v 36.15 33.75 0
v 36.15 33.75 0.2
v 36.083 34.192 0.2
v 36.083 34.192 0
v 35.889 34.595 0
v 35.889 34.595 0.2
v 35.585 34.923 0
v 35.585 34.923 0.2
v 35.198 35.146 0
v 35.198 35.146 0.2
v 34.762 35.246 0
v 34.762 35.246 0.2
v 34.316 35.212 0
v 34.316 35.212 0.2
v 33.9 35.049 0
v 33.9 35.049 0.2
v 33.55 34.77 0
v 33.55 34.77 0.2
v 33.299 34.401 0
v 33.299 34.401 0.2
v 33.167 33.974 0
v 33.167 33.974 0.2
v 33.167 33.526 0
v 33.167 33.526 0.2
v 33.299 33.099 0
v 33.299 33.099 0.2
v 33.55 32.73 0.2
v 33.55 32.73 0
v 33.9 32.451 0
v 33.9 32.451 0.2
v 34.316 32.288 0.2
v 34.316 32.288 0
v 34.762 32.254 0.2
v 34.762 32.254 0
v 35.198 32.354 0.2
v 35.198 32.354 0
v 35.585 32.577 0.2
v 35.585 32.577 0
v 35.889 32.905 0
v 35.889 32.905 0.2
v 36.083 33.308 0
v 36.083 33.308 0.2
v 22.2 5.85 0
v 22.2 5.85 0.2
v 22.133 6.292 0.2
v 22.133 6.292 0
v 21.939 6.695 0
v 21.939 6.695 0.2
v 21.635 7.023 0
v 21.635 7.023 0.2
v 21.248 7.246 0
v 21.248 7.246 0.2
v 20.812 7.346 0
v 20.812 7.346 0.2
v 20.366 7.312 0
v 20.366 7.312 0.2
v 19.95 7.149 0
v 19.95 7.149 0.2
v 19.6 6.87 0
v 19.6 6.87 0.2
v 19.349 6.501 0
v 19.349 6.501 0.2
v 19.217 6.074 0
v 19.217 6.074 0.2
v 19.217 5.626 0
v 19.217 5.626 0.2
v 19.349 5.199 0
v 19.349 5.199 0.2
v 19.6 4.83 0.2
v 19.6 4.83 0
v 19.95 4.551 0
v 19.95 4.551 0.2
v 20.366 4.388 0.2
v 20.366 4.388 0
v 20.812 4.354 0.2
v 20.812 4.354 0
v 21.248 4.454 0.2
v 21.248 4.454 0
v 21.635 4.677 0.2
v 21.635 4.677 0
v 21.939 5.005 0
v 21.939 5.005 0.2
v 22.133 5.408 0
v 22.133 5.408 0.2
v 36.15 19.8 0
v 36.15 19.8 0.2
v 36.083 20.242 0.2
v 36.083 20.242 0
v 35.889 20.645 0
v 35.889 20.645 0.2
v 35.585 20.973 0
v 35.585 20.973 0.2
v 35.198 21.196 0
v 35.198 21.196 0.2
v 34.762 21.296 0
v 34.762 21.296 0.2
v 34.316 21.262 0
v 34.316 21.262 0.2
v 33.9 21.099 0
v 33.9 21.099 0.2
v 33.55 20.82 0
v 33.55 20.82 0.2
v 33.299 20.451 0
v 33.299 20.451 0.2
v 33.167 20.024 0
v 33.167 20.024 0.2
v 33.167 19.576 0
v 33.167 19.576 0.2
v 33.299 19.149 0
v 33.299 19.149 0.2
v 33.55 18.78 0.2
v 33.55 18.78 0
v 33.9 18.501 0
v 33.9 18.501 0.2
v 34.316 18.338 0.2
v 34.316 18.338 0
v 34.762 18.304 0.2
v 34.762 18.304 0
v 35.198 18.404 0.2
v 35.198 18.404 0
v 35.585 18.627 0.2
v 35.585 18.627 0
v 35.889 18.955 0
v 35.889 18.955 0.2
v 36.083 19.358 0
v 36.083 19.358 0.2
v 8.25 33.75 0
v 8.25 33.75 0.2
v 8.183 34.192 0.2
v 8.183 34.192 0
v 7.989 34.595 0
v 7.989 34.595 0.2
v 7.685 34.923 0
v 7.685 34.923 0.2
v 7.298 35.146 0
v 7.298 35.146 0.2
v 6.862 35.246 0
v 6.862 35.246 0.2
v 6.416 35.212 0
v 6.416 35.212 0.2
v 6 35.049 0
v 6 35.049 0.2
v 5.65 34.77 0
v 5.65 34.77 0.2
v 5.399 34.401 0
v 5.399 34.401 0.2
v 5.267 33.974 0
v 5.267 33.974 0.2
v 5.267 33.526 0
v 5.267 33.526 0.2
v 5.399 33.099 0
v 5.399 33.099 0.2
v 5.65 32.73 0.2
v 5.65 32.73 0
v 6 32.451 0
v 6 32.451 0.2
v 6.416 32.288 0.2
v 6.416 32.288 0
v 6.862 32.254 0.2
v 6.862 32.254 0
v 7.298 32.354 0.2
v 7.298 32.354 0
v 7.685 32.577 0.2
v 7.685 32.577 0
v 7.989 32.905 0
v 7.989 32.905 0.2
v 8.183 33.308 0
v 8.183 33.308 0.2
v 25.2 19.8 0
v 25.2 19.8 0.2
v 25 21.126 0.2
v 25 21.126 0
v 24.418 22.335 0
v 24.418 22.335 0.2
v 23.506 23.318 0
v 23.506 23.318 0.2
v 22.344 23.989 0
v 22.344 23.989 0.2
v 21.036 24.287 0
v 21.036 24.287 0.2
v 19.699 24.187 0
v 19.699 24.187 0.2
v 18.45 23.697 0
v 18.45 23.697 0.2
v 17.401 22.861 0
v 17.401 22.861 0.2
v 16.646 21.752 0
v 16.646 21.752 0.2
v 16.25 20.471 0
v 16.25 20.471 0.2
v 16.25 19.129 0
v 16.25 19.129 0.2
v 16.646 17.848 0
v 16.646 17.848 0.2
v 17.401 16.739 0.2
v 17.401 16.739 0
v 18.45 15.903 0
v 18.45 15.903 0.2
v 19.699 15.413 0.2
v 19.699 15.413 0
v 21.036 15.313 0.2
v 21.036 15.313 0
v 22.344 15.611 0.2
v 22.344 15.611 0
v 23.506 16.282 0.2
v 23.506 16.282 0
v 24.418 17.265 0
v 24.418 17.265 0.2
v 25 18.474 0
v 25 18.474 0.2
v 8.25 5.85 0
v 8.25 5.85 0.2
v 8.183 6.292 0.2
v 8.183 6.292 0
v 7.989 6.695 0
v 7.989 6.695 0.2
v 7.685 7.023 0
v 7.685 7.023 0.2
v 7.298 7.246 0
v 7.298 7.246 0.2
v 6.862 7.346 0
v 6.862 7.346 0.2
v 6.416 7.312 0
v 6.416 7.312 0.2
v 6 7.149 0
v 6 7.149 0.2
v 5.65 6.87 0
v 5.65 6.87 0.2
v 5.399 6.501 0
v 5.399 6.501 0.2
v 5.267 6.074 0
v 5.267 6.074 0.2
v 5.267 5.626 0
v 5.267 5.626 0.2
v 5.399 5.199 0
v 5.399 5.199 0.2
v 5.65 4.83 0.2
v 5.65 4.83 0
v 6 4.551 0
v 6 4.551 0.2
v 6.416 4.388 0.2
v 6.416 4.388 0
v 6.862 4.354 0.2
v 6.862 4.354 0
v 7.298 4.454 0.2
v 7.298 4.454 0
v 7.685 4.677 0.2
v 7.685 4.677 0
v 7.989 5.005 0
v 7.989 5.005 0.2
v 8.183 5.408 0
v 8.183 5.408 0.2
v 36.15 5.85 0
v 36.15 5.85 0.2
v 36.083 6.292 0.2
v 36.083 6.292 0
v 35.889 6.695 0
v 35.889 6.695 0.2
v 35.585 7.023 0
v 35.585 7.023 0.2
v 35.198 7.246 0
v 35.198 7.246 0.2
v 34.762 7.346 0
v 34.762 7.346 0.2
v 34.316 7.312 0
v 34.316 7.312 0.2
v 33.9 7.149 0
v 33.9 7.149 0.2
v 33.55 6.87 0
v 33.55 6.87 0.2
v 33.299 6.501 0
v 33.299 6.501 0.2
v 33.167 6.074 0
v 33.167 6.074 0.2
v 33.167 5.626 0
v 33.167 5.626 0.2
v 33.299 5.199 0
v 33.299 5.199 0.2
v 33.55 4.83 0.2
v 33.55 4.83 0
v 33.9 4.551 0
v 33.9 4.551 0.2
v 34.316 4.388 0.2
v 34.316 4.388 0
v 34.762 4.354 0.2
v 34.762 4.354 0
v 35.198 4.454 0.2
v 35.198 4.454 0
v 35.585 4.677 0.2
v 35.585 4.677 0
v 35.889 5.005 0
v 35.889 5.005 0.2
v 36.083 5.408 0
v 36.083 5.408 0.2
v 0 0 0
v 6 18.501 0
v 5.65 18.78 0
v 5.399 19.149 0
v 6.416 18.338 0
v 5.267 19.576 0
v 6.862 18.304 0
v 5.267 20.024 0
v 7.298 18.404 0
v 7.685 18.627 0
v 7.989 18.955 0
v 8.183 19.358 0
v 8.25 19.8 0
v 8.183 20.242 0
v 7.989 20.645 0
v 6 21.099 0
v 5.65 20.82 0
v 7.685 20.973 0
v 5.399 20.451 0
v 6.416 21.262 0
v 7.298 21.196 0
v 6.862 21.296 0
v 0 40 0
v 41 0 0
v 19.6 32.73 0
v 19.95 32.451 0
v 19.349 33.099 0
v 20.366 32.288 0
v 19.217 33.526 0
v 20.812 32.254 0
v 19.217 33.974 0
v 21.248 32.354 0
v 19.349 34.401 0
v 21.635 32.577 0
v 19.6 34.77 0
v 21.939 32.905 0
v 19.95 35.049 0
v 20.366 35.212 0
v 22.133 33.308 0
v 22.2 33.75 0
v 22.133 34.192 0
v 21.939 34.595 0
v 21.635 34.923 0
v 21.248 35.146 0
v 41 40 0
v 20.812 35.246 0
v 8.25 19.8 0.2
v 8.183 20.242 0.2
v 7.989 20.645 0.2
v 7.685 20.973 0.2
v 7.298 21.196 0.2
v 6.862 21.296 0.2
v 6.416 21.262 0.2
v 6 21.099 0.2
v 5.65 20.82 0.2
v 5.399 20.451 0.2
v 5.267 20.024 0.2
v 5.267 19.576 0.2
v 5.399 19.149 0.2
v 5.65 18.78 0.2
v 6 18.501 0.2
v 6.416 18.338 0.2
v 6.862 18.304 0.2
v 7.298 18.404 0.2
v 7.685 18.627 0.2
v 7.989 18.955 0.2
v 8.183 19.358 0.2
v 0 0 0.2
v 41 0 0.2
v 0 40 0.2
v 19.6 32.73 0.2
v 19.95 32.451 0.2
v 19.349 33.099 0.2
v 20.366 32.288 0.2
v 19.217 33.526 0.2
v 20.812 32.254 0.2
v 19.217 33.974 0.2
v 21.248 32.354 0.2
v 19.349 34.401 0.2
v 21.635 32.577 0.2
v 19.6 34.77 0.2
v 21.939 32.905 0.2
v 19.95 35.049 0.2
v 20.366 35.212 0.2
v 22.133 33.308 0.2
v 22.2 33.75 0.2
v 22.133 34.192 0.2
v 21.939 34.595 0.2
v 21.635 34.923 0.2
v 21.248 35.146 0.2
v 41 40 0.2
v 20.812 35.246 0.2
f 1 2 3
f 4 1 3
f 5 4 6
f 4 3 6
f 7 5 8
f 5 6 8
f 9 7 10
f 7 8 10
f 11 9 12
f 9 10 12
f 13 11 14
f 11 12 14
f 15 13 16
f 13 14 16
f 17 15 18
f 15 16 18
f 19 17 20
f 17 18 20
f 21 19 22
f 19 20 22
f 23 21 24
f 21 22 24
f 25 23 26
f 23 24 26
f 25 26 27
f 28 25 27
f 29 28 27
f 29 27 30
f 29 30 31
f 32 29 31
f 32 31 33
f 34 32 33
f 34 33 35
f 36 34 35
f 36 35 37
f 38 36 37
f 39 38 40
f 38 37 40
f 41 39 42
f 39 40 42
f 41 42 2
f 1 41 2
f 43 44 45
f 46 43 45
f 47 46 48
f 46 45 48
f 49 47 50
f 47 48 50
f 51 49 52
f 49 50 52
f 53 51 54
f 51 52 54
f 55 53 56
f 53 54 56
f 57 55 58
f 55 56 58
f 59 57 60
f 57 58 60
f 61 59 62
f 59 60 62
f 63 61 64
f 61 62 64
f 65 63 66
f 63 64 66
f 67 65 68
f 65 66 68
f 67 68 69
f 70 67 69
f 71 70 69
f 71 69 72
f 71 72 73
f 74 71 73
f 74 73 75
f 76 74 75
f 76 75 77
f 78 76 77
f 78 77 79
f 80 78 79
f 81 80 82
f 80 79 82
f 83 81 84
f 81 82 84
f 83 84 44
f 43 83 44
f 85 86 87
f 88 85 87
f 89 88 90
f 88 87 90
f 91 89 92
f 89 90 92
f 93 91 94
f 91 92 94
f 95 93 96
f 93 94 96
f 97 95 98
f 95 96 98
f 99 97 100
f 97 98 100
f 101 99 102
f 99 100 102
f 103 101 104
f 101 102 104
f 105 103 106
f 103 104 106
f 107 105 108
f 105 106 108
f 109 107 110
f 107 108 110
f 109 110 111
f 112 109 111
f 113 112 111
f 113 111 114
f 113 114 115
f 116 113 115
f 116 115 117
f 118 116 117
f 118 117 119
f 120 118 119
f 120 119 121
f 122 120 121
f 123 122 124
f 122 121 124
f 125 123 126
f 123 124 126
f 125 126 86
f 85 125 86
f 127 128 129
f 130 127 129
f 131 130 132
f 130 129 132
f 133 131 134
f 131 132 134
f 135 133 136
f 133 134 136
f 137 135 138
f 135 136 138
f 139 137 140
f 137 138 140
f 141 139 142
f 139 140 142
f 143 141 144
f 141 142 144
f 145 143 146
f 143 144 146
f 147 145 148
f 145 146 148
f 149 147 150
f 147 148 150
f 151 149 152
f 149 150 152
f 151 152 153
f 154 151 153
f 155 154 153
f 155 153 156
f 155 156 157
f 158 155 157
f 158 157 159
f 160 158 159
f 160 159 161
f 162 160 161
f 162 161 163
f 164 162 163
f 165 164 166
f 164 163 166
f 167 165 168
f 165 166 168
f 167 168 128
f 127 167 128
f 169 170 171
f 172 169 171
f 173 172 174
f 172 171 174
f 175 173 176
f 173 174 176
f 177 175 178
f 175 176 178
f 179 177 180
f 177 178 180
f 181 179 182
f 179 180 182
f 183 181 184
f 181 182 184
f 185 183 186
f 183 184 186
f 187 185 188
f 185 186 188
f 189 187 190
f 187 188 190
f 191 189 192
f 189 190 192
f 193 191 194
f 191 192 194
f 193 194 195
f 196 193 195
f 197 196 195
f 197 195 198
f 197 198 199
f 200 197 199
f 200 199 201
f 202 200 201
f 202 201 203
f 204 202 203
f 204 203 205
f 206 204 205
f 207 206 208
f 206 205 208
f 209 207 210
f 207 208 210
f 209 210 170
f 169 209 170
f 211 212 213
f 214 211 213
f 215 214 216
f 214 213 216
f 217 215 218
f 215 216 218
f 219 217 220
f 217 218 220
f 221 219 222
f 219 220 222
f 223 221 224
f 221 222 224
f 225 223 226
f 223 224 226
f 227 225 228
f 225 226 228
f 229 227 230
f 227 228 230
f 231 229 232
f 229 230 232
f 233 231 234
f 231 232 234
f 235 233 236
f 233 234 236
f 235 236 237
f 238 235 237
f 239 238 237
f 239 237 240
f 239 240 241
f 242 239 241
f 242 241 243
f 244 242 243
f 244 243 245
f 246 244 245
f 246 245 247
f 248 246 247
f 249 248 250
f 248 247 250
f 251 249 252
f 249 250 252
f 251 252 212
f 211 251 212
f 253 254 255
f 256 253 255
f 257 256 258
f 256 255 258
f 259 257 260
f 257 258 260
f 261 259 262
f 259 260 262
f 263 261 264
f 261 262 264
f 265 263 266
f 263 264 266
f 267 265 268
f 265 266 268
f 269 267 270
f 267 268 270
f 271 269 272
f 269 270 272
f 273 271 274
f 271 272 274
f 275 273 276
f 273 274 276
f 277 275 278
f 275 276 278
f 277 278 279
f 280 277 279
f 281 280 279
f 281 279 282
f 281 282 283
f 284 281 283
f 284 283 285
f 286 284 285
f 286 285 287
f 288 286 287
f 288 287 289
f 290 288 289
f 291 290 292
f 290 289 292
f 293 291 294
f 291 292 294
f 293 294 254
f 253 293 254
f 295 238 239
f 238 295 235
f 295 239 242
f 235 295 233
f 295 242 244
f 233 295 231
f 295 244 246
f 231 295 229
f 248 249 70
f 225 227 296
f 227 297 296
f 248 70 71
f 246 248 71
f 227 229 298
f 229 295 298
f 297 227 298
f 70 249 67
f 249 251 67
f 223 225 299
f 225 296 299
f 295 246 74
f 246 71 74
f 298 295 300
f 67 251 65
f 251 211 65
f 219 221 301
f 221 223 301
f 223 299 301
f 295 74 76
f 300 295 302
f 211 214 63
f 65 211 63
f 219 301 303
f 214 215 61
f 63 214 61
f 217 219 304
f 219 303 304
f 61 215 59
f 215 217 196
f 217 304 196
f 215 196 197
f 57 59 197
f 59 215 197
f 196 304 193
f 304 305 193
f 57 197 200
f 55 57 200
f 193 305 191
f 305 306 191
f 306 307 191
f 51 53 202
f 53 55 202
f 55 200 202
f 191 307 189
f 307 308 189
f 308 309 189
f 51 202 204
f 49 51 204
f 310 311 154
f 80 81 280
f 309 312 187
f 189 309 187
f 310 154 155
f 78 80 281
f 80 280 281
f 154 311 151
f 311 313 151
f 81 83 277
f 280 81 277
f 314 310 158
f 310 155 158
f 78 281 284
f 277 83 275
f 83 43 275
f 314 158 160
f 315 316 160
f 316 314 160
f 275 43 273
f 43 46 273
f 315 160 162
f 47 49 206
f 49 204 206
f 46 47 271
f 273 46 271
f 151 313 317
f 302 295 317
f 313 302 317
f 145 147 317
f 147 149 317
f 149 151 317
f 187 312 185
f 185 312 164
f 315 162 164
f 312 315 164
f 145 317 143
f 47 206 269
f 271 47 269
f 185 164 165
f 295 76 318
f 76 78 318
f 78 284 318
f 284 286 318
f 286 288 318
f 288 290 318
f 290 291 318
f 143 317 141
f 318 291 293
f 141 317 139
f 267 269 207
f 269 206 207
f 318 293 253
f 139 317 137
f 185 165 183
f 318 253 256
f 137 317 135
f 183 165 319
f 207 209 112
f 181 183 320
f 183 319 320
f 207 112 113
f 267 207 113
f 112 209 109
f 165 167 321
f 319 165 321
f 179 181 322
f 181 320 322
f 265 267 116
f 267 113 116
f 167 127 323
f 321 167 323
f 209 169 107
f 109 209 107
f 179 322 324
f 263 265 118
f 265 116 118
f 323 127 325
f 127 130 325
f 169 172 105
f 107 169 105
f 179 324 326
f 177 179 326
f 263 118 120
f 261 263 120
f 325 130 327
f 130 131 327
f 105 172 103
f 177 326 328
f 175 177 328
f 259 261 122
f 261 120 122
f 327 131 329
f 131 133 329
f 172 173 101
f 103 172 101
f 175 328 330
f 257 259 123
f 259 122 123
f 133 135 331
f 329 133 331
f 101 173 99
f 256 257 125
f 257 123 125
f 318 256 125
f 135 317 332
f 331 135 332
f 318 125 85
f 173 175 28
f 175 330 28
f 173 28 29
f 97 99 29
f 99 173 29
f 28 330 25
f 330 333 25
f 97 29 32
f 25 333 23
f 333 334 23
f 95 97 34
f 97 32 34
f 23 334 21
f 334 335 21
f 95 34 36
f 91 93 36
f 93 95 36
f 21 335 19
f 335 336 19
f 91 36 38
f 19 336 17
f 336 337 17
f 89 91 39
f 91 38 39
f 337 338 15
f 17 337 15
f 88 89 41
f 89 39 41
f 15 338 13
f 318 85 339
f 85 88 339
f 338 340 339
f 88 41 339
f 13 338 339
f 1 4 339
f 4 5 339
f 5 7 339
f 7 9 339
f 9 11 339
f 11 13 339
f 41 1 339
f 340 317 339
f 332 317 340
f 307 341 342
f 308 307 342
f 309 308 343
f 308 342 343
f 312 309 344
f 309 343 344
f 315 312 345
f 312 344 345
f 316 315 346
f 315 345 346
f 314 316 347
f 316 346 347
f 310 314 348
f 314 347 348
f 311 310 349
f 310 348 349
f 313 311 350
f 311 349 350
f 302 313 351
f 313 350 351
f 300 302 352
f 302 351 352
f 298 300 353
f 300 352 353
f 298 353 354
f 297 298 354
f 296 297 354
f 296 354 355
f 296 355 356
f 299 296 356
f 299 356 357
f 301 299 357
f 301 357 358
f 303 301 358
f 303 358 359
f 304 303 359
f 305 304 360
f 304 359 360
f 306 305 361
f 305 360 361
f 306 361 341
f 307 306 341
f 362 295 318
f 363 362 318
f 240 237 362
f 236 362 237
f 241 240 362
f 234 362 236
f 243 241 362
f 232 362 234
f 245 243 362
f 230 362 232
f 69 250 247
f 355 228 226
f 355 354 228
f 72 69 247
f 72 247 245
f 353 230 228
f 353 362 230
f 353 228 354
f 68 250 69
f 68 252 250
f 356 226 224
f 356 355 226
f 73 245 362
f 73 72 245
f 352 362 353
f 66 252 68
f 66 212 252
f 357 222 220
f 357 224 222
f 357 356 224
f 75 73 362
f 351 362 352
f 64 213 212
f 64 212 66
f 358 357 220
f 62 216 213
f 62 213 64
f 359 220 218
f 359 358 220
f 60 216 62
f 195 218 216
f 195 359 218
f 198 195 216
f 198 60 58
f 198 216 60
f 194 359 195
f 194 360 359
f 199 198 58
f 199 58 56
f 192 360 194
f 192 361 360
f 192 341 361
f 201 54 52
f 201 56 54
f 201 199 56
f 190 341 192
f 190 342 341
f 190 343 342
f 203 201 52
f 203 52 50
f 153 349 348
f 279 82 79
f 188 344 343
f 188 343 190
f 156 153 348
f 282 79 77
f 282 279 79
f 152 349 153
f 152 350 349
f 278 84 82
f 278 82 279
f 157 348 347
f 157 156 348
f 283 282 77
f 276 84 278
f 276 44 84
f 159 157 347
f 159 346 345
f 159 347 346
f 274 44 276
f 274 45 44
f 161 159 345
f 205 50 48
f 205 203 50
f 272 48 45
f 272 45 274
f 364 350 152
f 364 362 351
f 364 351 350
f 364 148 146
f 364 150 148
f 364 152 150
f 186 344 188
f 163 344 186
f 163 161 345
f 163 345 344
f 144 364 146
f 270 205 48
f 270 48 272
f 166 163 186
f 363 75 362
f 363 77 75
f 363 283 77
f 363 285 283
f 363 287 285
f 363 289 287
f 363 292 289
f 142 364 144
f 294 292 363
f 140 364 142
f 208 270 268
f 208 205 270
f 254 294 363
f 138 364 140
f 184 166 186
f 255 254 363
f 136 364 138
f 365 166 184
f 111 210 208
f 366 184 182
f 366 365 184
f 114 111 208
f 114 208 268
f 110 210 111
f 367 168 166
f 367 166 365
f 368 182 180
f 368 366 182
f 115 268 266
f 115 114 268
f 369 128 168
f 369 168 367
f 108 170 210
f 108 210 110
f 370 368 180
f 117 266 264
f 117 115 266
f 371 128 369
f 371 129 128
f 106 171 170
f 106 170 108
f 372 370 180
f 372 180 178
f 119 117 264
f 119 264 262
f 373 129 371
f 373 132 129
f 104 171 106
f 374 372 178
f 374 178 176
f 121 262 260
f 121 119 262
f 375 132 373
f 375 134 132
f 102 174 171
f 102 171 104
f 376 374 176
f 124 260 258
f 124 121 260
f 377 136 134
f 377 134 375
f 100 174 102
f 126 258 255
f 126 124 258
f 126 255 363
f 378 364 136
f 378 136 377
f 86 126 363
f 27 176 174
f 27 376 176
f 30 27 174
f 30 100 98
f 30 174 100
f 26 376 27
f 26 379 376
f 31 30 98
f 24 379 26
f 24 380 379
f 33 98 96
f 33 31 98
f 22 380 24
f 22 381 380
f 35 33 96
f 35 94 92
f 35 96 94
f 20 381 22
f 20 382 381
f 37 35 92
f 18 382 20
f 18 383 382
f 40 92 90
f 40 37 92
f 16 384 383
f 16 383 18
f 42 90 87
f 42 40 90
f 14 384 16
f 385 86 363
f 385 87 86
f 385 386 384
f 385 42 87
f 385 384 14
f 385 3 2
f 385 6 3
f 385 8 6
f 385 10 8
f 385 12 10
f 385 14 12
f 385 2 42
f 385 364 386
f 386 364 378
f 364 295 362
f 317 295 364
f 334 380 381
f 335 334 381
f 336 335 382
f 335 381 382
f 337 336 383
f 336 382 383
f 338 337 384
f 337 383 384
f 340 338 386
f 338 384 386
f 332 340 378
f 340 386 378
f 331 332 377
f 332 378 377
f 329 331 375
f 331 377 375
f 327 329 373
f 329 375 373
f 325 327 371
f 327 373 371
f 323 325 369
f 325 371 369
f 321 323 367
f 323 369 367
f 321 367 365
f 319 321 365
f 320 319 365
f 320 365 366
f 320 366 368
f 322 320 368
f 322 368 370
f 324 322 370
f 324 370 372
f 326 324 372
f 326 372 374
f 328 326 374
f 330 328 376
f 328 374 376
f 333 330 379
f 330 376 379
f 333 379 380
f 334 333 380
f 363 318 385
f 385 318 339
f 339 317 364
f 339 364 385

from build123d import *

# Parameters (mm, degrees)
SKETCH_1_W          = 41
SKETCH_1_H          = 40
EXTRUDE_1_DEPTH     = 0.2
SKETCH_5_R          = 4.5
CUT_EXTRUDE_3_DEPTH = 0.2
SKETCH_6_R          = 1.5
CUT_EXTRUDE_4_DEPTH = 0.2


with BuildPart() as part:
    # 스케치1 → 보스-돌출1 (new body)
    with BuildSketch(Plane.XY):
        with Locations((20.5, 20)):
            Rectangle(SKETCH_1_W, SKETCH_1_H)
    extrude(amount=EXTRUDE_1_DEPTH)

    # 스케치5 → 컷-돌출3 (cut)
    with BuildSketch(Plane.XY.offset(0.2)):
        with Locations((20.7, 19.8)):
            Circle(SKETCH_5_R)
    extrude(amount=-CUT_EXTRUDE_3_DEPTH, mode=Mode.SUBTRACT)

    # 스케치6 → 컷-돌출4 (cut)
    with BuildSketch(Plane.XY.offset(0.2)):
        with Locations((20.7, 33.75)):
            Circle(SKETCH_6_R)
        with Locations((34.65, 33.75)):
            Circle(SKETCH_6_R)
        with Locations((34.65, 19.8)):
            Circle(SKETCH_6_R)
        with Locations((20.7, 5.85)):
            Circle(SKETCH_6_R)
        with Locations((34.65, 5.85)):
            Circle(SKETCH_6_R)
        with Locations((6.75, 5.85)):
            Circle(SKETCH_6_R)
        with Locations((6.75, 33.75)):
            Circle(SKETCH_6_R)
        with Locations((6.75, 19.8)):
            Circle(SKETCH_6_R)
    extrude(amount=-CUT_EXTRUDE_4_DEPTH, mode=Mode.SUBTRACT)


solid = part.part
